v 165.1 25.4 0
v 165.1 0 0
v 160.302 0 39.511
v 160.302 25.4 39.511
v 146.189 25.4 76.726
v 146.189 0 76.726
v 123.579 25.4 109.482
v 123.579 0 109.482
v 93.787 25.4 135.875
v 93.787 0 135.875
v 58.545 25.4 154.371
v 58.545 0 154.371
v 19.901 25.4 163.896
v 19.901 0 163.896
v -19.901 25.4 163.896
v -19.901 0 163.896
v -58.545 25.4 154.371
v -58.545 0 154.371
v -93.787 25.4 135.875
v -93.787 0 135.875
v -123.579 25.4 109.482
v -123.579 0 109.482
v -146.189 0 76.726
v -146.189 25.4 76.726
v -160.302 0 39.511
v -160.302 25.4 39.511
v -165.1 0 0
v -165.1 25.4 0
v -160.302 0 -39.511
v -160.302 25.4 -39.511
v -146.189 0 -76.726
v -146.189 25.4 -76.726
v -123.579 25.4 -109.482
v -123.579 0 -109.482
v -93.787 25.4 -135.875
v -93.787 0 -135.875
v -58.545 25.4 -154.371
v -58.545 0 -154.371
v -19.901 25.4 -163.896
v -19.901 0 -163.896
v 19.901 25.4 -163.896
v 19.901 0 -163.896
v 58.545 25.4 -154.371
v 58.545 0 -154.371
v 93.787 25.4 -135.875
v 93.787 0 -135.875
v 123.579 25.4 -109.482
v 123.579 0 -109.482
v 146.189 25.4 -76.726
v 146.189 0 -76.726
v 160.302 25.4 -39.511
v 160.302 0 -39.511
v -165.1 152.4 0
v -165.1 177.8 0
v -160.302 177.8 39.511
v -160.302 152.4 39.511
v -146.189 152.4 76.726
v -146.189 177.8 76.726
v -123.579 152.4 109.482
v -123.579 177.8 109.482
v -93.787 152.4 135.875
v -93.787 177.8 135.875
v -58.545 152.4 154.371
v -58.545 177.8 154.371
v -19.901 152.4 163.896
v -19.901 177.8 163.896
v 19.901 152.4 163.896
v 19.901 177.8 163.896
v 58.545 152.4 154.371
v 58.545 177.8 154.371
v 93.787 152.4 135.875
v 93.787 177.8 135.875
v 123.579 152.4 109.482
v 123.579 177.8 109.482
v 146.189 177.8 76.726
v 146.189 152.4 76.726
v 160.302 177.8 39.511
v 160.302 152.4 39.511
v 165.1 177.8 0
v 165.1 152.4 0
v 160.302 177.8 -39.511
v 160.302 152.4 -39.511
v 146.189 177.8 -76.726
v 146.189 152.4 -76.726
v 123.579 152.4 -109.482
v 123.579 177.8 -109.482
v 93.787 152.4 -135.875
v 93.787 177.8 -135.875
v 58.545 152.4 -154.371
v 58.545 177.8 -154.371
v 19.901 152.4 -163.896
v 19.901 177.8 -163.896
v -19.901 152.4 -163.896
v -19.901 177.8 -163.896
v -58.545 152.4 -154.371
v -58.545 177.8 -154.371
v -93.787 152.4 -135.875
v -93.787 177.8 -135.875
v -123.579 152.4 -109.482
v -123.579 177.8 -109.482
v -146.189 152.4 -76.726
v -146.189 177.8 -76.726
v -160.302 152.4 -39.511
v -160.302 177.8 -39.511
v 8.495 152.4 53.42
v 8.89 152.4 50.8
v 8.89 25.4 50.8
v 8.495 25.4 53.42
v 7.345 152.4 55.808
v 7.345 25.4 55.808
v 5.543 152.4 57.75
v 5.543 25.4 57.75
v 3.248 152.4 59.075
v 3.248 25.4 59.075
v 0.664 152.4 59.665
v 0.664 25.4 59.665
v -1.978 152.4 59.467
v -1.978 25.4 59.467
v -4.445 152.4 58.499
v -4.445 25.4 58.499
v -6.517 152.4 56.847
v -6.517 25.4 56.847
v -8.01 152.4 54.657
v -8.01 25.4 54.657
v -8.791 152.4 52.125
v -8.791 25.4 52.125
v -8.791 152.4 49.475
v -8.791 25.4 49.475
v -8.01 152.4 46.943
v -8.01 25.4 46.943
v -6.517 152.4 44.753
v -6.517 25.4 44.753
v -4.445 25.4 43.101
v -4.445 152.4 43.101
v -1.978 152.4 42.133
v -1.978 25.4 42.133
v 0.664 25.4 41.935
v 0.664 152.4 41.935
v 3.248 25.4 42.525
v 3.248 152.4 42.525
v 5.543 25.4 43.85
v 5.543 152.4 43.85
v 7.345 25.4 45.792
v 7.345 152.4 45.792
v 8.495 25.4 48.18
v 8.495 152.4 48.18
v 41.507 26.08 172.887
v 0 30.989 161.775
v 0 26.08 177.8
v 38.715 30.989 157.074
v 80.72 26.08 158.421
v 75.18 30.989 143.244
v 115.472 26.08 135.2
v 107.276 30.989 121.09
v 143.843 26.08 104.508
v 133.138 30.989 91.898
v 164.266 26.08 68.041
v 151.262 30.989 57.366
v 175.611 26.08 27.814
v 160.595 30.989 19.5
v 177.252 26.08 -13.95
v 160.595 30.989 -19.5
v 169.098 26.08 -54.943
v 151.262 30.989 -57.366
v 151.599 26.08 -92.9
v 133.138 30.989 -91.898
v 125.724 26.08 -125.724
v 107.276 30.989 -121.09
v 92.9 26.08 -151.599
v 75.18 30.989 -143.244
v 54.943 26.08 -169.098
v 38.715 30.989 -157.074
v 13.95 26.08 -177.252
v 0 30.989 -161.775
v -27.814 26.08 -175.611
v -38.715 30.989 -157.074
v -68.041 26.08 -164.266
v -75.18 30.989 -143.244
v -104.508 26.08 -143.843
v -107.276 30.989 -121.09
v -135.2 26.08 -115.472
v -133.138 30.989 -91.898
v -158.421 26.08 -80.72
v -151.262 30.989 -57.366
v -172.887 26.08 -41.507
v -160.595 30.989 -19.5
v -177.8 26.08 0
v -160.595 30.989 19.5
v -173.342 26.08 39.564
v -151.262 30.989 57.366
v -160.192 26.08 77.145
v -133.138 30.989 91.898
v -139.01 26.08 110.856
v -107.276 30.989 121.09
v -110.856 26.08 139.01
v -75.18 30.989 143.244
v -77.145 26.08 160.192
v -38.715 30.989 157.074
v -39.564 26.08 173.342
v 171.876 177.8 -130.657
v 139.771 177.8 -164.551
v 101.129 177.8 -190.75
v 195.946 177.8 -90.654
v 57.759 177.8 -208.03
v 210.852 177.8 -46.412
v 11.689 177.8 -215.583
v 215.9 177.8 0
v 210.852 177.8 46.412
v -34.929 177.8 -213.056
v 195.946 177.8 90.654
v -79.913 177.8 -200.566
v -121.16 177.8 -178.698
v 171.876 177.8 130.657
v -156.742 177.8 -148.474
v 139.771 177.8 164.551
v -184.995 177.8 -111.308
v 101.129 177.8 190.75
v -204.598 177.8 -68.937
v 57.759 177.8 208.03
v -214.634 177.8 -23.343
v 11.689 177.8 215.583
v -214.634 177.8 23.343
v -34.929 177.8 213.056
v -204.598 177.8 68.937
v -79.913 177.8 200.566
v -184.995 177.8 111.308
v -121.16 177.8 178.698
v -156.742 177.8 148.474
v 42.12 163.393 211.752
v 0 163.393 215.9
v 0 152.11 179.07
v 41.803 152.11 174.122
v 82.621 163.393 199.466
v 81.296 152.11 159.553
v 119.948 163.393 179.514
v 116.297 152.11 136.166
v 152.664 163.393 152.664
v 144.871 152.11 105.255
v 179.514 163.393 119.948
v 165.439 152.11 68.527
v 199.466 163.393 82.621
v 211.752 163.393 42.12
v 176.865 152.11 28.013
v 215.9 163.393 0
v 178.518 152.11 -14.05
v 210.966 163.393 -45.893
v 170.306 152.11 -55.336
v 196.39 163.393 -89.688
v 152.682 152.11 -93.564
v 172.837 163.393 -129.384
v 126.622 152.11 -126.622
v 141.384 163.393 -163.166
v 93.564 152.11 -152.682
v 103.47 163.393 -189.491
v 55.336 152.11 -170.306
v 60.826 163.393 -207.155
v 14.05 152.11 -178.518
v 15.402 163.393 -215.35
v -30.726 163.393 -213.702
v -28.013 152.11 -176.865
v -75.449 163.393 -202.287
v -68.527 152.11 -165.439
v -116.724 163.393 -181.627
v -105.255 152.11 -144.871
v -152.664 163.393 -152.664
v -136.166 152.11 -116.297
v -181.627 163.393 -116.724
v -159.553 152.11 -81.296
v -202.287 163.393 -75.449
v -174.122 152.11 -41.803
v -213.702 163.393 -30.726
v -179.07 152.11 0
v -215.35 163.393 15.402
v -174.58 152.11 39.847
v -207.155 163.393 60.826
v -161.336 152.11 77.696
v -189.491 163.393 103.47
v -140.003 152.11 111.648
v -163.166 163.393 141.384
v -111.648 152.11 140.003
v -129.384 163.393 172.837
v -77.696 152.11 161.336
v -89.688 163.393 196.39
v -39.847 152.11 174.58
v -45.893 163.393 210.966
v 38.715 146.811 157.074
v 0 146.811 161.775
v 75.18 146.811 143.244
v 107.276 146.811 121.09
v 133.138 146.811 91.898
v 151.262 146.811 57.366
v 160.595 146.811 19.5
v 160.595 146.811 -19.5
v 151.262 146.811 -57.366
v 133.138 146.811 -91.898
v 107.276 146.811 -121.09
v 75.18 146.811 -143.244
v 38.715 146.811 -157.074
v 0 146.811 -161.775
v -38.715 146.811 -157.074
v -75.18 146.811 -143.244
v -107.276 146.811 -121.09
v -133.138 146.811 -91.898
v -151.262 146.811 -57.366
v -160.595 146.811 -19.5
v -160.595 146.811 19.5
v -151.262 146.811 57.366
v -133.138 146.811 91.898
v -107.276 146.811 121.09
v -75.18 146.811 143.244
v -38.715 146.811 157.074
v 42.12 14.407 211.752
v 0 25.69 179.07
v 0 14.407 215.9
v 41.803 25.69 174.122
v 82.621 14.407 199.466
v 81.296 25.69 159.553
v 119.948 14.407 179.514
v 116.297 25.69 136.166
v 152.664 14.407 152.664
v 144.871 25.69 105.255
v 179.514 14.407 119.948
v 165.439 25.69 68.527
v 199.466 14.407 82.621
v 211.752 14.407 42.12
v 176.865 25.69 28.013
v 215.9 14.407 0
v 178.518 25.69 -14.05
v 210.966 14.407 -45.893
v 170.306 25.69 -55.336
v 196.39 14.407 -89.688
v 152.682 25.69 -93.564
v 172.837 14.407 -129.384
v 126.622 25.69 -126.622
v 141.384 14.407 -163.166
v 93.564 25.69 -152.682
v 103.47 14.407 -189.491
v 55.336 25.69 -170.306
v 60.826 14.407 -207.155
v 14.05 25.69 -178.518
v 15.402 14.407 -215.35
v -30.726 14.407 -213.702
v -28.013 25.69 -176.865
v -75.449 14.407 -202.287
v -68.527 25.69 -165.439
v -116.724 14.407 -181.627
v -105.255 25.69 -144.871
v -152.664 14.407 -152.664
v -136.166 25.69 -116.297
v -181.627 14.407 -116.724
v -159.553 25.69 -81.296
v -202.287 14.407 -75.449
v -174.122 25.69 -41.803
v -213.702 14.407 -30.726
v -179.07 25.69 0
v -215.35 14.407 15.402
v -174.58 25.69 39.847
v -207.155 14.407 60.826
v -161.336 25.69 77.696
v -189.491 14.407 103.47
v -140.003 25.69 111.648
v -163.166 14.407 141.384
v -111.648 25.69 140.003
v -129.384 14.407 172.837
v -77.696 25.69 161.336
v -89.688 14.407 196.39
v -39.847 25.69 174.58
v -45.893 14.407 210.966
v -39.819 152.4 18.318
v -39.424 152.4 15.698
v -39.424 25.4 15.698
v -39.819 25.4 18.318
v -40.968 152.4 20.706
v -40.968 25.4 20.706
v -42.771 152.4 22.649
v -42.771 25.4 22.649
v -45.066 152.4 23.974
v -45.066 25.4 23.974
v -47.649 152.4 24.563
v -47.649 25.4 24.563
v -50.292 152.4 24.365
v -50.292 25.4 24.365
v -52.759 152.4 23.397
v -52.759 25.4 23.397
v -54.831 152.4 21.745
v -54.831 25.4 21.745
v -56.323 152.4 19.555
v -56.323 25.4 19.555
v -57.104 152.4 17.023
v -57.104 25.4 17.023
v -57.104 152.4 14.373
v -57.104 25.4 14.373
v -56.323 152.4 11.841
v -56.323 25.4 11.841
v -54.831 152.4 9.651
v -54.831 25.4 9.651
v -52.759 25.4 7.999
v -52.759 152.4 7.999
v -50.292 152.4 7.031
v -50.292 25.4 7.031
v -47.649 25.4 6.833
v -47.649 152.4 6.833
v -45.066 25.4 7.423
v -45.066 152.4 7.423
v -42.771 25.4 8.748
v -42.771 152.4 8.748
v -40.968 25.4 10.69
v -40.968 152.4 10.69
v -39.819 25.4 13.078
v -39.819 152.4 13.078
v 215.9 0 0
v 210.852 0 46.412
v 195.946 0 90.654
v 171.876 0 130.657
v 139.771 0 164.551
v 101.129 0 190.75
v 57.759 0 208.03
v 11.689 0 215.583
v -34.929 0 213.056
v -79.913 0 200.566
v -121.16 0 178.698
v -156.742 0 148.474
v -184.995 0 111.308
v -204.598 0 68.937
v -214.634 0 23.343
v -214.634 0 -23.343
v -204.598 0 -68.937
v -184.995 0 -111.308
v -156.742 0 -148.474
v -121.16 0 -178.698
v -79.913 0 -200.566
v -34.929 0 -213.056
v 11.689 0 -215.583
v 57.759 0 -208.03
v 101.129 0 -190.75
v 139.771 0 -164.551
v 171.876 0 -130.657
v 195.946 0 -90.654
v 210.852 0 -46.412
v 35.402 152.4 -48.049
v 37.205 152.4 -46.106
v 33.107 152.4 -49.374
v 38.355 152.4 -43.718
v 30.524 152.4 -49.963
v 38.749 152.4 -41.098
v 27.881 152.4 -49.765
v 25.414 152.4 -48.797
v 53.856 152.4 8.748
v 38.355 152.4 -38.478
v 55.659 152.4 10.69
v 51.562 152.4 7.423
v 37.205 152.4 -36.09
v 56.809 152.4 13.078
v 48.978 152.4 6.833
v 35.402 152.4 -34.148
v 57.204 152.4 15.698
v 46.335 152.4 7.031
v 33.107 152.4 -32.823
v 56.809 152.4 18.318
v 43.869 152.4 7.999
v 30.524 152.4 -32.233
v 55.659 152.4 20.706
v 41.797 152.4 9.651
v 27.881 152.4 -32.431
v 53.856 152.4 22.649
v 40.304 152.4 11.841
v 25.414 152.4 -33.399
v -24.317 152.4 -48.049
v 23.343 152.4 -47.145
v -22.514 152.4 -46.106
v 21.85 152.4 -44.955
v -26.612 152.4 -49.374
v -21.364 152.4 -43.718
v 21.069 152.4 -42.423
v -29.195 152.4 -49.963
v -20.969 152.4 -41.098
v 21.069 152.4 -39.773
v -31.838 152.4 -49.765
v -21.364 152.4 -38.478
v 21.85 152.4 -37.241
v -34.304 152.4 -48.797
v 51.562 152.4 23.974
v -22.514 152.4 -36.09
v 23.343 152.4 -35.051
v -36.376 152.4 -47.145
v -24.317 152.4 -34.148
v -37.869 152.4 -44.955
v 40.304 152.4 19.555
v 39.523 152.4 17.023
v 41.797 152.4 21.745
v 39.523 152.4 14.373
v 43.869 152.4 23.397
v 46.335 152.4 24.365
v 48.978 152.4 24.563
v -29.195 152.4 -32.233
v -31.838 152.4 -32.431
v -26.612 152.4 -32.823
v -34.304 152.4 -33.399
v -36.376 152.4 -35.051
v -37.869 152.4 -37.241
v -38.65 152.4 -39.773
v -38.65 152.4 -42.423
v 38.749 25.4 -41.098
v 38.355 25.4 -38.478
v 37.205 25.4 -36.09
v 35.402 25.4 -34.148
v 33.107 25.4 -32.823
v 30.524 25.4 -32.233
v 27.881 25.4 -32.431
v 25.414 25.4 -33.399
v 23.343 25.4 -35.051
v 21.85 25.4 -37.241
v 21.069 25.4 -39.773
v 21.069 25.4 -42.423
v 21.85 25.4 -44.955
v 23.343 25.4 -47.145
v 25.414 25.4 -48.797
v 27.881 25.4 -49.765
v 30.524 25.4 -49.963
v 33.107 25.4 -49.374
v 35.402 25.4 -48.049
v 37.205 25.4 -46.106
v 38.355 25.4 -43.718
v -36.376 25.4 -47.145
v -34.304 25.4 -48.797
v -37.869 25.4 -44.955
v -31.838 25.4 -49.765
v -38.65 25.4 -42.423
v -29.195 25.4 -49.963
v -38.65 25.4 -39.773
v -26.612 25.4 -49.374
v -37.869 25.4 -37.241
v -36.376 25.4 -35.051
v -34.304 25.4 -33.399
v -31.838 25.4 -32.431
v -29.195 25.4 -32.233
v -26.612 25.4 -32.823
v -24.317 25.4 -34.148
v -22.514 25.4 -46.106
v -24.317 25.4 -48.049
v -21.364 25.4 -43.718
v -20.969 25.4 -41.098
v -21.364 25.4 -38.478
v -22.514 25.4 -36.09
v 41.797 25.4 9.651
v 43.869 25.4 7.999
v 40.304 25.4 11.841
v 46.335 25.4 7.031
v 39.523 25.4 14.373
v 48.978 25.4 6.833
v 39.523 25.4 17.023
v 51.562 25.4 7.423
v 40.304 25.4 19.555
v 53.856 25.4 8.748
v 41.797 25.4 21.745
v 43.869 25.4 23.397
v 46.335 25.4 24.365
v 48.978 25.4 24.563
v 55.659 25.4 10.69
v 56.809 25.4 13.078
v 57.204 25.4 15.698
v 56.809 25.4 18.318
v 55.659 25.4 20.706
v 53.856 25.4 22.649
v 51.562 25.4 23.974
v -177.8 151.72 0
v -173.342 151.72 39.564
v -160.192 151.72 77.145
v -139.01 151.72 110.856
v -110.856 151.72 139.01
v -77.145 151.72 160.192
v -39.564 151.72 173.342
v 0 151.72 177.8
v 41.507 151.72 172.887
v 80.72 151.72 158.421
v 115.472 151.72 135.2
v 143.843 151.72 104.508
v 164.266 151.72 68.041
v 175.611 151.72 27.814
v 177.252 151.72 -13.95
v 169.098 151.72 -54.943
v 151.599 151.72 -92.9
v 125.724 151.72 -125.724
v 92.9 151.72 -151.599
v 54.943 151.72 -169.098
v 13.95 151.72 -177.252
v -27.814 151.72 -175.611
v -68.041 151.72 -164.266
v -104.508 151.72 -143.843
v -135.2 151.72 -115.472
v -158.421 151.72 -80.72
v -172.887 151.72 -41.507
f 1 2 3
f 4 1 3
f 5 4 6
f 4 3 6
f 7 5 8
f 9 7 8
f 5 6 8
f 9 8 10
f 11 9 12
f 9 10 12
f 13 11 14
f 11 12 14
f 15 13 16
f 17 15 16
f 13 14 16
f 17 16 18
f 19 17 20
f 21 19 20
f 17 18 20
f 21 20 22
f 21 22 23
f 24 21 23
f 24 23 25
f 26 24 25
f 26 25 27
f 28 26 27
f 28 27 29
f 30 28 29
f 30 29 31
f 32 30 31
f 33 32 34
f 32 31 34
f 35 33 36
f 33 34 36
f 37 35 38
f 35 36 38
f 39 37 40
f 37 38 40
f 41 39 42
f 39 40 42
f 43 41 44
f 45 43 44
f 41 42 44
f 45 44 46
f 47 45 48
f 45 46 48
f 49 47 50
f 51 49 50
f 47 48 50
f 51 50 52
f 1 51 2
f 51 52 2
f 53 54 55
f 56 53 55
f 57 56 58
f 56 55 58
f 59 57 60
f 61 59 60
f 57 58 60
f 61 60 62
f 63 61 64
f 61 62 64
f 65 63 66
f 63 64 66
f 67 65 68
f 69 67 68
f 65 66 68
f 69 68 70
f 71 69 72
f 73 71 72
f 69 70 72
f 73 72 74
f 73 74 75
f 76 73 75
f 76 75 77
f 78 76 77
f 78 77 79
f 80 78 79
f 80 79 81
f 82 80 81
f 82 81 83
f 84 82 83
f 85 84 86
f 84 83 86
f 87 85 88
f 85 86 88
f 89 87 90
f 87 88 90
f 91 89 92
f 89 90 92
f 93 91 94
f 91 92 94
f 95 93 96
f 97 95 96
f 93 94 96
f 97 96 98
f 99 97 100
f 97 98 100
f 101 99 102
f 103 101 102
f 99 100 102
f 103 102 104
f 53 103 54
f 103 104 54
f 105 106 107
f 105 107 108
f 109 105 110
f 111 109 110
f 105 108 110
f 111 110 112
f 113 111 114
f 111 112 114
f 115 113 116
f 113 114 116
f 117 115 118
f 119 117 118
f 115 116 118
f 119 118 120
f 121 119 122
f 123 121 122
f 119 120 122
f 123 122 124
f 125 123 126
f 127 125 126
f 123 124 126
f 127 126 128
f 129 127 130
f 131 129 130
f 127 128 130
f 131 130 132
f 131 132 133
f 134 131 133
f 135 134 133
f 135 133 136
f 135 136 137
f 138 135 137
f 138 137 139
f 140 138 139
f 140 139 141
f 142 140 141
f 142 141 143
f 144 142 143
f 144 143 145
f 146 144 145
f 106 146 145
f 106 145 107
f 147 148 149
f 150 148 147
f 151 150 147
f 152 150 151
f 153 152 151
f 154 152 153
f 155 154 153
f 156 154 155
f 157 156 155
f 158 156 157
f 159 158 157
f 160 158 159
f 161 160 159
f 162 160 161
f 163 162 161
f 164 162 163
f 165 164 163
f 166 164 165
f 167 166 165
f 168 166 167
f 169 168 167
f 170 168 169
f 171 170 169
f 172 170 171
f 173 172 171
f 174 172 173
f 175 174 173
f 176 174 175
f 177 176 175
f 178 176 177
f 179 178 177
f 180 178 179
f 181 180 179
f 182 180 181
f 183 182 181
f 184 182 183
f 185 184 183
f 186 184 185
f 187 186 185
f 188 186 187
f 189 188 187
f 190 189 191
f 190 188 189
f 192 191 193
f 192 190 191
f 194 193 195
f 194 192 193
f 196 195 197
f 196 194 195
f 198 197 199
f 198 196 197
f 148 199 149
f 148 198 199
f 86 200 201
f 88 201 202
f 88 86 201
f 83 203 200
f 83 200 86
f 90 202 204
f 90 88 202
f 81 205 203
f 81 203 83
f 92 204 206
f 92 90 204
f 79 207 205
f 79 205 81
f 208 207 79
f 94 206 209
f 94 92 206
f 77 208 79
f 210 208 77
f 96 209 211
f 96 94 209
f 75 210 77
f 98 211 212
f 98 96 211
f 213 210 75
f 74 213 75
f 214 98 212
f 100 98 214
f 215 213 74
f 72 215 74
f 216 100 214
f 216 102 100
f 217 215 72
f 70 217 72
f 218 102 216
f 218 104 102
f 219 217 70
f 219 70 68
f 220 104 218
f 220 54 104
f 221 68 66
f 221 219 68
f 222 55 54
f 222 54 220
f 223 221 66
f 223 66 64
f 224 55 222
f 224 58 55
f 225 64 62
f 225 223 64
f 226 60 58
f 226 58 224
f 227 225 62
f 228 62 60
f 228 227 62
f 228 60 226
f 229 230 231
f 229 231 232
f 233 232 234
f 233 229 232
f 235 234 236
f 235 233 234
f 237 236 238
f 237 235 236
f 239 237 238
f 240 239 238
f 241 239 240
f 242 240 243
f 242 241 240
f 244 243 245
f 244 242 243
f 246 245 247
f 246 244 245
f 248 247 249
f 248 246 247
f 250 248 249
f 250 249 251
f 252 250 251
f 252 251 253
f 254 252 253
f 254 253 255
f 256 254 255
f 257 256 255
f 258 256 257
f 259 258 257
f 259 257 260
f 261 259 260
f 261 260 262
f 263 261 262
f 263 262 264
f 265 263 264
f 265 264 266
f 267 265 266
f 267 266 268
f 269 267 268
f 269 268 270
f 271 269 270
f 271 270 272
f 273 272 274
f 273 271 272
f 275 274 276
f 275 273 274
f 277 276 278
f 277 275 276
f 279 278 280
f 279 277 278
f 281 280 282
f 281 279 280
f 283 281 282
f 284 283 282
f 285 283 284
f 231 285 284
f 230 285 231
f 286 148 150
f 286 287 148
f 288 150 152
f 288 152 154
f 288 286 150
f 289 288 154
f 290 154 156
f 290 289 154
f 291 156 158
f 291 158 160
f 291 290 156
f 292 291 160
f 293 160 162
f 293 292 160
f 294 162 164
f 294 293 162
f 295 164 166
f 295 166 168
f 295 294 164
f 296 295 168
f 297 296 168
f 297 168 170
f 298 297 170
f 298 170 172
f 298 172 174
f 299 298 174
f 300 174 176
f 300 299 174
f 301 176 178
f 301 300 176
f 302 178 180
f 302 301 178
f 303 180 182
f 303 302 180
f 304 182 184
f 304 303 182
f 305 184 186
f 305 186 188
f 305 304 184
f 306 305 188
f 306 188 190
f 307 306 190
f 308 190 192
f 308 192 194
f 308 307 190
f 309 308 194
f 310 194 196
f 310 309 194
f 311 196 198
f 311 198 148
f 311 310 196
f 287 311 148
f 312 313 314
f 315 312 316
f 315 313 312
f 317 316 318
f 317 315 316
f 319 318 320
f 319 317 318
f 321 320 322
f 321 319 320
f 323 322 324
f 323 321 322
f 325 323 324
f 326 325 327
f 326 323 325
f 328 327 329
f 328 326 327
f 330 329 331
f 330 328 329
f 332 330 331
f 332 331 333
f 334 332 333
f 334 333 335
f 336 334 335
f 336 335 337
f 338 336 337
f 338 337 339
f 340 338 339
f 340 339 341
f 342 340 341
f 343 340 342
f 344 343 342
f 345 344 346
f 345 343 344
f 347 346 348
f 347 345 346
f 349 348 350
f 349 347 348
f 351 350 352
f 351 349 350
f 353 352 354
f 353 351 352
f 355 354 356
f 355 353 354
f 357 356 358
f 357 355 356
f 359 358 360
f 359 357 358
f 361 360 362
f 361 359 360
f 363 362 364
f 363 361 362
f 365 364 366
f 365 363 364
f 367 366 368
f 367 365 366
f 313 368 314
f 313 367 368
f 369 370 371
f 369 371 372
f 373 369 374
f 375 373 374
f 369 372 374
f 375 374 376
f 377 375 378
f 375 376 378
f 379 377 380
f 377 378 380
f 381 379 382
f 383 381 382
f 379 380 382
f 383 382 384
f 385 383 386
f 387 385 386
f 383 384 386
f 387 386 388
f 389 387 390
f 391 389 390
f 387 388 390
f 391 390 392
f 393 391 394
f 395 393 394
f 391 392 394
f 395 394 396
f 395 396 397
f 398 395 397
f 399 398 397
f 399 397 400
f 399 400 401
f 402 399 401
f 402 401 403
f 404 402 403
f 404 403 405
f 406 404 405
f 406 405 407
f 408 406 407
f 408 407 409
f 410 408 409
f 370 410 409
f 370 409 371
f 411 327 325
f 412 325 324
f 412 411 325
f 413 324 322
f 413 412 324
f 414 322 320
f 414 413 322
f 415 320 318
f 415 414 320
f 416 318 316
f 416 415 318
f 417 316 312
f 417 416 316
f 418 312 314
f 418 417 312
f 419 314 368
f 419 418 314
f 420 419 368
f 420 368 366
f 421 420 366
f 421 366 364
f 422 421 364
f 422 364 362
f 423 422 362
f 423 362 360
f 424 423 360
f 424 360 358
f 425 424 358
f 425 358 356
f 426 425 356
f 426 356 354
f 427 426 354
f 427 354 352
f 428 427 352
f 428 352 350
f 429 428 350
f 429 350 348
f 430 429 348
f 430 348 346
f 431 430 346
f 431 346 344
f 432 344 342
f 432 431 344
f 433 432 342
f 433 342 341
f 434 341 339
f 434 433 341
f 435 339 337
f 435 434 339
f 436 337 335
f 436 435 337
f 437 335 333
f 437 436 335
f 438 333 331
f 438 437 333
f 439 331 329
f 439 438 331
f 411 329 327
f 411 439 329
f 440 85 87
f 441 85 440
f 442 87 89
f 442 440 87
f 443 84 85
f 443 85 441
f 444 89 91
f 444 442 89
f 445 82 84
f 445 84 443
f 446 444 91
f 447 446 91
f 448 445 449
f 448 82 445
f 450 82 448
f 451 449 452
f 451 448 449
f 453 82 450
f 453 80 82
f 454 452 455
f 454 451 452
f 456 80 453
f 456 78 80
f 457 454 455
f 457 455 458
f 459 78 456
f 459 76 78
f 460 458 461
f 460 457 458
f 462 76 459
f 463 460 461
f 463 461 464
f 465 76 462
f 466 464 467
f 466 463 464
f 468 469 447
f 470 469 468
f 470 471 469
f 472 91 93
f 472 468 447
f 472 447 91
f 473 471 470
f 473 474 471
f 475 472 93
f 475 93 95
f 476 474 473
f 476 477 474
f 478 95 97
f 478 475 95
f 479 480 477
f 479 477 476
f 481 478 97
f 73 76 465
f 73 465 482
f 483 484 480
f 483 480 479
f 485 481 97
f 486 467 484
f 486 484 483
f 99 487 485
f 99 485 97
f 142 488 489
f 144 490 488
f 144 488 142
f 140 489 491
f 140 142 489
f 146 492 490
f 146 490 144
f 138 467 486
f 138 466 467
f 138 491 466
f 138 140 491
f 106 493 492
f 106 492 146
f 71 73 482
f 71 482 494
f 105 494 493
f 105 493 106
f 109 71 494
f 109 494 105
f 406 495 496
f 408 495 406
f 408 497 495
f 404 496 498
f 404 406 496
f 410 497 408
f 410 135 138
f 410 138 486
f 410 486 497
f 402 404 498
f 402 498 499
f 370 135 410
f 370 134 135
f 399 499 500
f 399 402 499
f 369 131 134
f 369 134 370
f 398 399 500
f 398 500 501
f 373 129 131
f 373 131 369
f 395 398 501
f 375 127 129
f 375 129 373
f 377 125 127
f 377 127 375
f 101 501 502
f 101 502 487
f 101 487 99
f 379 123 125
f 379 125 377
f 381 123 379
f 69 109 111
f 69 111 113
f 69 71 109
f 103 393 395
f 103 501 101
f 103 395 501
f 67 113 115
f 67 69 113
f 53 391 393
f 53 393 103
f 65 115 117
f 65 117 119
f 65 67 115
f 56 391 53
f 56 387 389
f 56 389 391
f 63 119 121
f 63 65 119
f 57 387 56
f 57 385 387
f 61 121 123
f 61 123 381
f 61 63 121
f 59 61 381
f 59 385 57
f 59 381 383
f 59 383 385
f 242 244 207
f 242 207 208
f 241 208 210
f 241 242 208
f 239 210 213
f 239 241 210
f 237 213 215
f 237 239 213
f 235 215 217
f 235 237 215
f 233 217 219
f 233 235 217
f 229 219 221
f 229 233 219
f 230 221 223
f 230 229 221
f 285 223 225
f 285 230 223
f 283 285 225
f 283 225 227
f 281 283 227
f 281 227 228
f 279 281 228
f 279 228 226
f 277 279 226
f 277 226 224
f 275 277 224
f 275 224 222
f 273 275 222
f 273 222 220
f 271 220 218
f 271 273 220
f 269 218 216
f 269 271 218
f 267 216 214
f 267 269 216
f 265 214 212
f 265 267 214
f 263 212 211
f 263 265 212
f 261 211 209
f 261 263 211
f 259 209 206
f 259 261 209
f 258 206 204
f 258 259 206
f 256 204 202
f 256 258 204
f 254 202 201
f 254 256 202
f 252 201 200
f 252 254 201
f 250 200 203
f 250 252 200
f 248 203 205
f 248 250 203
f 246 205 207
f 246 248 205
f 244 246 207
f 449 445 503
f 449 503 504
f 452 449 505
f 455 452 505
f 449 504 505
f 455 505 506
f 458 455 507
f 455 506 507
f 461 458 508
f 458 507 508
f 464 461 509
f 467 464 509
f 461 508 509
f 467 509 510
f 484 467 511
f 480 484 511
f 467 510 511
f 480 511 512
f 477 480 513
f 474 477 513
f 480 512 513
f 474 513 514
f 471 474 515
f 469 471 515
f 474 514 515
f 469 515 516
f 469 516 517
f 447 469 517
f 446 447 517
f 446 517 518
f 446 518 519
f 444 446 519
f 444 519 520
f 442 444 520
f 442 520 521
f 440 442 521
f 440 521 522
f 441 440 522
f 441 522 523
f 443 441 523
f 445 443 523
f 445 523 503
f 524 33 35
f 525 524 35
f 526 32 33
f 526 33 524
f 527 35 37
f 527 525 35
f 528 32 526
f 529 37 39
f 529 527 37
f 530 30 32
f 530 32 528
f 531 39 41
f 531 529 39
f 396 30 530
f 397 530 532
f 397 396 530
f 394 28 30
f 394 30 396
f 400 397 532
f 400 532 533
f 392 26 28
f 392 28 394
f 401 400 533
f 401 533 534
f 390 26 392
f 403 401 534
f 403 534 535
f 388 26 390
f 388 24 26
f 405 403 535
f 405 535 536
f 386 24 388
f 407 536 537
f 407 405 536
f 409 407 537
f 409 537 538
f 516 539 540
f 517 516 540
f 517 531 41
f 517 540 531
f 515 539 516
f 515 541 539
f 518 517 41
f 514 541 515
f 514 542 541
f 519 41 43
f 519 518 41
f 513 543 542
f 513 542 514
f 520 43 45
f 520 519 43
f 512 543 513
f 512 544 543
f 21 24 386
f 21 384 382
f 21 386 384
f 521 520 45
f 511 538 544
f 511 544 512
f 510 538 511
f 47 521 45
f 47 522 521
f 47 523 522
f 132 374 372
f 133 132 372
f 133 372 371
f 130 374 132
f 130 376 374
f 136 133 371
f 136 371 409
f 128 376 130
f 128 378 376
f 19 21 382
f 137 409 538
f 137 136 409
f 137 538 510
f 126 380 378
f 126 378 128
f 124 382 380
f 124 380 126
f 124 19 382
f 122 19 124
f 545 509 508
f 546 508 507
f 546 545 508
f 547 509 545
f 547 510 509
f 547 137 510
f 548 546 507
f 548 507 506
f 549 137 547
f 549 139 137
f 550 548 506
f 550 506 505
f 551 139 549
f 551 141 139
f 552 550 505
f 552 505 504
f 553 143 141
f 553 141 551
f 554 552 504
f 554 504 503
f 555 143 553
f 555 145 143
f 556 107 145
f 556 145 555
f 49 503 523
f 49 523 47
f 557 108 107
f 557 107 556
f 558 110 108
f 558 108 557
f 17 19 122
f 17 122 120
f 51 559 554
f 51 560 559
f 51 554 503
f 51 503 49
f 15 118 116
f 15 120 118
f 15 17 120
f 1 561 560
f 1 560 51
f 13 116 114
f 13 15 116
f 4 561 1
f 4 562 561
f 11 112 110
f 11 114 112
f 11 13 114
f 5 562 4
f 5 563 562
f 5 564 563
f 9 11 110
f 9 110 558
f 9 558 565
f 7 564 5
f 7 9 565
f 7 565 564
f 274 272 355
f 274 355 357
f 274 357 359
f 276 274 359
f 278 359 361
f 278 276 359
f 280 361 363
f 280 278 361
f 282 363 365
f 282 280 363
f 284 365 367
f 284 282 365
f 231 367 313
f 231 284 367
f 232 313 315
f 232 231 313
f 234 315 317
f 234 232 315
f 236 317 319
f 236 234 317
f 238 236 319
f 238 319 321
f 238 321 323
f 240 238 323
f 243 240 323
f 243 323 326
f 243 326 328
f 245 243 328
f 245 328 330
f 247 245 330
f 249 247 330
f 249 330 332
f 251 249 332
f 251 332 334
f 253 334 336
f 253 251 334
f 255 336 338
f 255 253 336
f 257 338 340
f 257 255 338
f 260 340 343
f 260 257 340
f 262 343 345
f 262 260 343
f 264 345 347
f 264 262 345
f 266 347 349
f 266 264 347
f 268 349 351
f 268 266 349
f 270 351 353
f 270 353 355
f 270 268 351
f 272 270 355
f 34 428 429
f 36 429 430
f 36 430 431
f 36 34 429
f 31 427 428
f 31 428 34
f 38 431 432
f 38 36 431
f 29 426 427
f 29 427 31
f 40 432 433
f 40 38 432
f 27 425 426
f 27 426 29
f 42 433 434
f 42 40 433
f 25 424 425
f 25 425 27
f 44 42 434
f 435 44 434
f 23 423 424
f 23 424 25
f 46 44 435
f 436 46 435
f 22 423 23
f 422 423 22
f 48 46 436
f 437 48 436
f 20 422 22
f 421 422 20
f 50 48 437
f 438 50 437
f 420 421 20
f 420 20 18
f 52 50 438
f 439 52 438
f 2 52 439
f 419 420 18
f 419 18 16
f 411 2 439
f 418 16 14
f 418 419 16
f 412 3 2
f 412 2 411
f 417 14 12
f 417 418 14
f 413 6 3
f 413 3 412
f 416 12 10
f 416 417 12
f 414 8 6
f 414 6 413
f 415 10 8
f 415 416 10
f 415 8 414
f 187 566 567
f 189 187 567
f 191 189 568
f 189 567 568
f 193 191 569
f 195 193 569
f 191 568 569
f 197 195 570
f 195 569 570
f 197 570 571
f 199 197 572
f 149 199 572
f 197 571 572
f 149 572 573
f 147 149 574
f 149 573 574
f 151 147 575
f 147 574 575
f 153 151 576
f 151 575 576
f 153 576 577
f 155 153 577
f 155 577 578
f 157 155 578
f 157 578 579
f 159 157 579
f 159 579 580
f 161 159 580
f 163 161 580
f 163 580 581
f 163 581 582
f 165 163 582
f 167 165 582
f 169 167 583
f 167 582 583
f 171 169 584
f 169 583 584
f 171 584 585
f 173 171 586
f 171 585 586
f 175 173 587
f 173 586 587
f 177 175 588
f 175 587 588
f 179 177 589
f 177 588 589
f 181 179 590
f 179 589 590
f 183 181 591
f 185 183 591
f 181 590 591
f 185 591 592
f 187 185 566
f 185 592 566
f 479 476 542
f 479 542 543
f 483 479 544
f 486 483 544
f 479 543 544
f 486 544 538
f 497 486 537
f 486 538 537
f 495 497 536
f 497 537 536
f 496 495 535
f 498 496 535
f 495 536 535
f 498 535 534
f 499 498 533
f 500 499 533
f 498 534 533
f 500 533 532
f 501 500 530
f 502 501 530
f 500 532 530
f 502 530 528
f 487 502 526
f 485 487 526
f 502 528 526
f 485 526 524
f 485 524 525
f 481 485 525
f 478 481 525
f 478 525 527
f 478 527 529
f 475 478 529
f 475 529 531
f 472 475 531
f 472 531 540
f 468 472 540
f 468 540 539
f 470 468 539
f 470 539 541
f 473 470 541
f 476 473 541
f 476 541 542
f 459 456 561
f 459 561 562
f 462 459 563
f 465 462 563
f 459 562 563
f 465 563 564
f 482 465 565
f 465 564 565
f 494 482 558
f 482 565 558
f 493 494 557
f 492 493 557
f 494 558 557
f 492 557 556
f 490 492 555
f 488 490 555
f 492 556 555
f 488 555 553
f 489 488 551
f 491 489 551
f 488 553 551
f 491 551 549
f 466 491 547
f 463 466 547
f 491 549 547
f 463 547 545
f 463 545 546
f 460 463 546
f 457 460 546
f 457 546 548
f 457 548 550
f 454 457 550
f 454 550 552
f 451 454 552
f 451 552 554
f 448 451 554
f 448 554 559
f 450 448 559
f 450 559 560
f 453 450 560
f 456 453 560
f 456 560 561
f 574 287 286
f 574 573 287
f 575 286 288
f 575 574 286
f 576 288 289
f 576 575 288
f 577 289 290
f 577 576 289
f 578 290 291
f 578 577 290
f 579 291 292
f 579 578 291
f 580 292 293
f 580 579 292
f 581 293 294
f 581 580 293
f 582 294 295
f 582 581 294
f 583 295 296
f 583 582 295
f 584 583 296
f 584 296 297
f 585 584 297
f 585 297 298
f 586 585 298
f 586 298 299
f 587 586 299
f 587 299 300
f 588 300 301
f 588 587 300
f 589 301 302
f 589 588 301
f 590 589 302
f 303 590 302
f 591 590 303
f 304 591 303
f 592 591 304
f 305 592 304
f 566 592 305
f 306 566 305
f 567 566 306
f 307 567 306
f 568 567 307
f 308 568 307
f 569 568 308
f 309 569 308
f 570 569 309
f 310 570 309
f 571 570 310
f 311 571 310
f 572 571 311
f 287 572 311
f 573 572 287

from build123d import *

# Parameters (mm, degrees)
F0_R      = 215.9
F1_DEPTH  = 177.8
F5_R      = 165.1
F6_DEPTH  = 25.4
F7_R      = 165.1
F8_DEPTH  = 25.4
F9_R      = 8.89
F10_DEPTH = 152.401
F11_R     = 179.07
F11_R_2   = 177.8
F12_DEPTH = 158.75


with BuildPart() as f1:
    # F0 (on Front) → F1 (new body)
    with BuildSketch(Plane.XZ):
        Circle(F0_R)
    extrude(amount=-F1_DEPTH)

    # F2 (on Right) → F4 (revolve, cut)
    with BuildSketch(Plane.YZ):
        Polygon((165.534003, 222.889437), (88.9, 222.889437), (88.9, 161.774579), (92.761464, 161.774579), (146.810961, 161.774579), align=None)
        Polygon((88.9, 222.889437), (12.265997, 222.889437), (30.989039, 161.774579), (85.038536, 161.774579), (88.9, 161.774579), align=None)
    revolve(axis=Axis((0, 134.683609, 0), (0, 1, 0)), mode=Mode.SUBTRACT)

    # F5 (on face) → F6 (cut)
    with BuildSketch(Plane.XZ):
        Circle(F5_R)
    extrude(amount=-F6_DEPTH, mode=Mode.SUBTRACT)

    # F7 (on face) → F8 (cut)
    with BuildSketch(Plane(origin=(0, 177.8, 0), x_dir=(-1, 0, 0), z_dir=(0, 1, 0))):
        Circle(F7_R)
    extrude(amount=-F8_DEPTH, mode=Mode.SUBTRACT)

    # F9 (on face) → F10 (cut, through all)
    with BuildSketch(Plane.XZ.offset(-25.4)):
        with Locations((0, 50.8)):
            Circle(F9_R)
        with Locations((-48.313671, 15.698063)):
            Circle(F9_R)
        with Locations((-29.859491, -41.098063)):
            Circle(F9_R)
        with Locations((29.859491, -41.098063)):
            Circle(F9_R)
        with Locations((48.313671, 15.698063)):
            Circle(F9_R)
    extrude(amount=-F10_DEPTH, mode=Mode.SUBTRACT)

    # F11 (on face) → F12 (join)
    with BuildSketch(Plane(origin=(0, 177.8, 0), x_dir=(-1, 0, 0), z_dir=(0, 1, 0))):
        Circle(F11_R)
        Circle(F11_R_2, mode=Mode.SUBTRACT)
    extrude(amount=-F12_DEPTH)


solid = f1.part
